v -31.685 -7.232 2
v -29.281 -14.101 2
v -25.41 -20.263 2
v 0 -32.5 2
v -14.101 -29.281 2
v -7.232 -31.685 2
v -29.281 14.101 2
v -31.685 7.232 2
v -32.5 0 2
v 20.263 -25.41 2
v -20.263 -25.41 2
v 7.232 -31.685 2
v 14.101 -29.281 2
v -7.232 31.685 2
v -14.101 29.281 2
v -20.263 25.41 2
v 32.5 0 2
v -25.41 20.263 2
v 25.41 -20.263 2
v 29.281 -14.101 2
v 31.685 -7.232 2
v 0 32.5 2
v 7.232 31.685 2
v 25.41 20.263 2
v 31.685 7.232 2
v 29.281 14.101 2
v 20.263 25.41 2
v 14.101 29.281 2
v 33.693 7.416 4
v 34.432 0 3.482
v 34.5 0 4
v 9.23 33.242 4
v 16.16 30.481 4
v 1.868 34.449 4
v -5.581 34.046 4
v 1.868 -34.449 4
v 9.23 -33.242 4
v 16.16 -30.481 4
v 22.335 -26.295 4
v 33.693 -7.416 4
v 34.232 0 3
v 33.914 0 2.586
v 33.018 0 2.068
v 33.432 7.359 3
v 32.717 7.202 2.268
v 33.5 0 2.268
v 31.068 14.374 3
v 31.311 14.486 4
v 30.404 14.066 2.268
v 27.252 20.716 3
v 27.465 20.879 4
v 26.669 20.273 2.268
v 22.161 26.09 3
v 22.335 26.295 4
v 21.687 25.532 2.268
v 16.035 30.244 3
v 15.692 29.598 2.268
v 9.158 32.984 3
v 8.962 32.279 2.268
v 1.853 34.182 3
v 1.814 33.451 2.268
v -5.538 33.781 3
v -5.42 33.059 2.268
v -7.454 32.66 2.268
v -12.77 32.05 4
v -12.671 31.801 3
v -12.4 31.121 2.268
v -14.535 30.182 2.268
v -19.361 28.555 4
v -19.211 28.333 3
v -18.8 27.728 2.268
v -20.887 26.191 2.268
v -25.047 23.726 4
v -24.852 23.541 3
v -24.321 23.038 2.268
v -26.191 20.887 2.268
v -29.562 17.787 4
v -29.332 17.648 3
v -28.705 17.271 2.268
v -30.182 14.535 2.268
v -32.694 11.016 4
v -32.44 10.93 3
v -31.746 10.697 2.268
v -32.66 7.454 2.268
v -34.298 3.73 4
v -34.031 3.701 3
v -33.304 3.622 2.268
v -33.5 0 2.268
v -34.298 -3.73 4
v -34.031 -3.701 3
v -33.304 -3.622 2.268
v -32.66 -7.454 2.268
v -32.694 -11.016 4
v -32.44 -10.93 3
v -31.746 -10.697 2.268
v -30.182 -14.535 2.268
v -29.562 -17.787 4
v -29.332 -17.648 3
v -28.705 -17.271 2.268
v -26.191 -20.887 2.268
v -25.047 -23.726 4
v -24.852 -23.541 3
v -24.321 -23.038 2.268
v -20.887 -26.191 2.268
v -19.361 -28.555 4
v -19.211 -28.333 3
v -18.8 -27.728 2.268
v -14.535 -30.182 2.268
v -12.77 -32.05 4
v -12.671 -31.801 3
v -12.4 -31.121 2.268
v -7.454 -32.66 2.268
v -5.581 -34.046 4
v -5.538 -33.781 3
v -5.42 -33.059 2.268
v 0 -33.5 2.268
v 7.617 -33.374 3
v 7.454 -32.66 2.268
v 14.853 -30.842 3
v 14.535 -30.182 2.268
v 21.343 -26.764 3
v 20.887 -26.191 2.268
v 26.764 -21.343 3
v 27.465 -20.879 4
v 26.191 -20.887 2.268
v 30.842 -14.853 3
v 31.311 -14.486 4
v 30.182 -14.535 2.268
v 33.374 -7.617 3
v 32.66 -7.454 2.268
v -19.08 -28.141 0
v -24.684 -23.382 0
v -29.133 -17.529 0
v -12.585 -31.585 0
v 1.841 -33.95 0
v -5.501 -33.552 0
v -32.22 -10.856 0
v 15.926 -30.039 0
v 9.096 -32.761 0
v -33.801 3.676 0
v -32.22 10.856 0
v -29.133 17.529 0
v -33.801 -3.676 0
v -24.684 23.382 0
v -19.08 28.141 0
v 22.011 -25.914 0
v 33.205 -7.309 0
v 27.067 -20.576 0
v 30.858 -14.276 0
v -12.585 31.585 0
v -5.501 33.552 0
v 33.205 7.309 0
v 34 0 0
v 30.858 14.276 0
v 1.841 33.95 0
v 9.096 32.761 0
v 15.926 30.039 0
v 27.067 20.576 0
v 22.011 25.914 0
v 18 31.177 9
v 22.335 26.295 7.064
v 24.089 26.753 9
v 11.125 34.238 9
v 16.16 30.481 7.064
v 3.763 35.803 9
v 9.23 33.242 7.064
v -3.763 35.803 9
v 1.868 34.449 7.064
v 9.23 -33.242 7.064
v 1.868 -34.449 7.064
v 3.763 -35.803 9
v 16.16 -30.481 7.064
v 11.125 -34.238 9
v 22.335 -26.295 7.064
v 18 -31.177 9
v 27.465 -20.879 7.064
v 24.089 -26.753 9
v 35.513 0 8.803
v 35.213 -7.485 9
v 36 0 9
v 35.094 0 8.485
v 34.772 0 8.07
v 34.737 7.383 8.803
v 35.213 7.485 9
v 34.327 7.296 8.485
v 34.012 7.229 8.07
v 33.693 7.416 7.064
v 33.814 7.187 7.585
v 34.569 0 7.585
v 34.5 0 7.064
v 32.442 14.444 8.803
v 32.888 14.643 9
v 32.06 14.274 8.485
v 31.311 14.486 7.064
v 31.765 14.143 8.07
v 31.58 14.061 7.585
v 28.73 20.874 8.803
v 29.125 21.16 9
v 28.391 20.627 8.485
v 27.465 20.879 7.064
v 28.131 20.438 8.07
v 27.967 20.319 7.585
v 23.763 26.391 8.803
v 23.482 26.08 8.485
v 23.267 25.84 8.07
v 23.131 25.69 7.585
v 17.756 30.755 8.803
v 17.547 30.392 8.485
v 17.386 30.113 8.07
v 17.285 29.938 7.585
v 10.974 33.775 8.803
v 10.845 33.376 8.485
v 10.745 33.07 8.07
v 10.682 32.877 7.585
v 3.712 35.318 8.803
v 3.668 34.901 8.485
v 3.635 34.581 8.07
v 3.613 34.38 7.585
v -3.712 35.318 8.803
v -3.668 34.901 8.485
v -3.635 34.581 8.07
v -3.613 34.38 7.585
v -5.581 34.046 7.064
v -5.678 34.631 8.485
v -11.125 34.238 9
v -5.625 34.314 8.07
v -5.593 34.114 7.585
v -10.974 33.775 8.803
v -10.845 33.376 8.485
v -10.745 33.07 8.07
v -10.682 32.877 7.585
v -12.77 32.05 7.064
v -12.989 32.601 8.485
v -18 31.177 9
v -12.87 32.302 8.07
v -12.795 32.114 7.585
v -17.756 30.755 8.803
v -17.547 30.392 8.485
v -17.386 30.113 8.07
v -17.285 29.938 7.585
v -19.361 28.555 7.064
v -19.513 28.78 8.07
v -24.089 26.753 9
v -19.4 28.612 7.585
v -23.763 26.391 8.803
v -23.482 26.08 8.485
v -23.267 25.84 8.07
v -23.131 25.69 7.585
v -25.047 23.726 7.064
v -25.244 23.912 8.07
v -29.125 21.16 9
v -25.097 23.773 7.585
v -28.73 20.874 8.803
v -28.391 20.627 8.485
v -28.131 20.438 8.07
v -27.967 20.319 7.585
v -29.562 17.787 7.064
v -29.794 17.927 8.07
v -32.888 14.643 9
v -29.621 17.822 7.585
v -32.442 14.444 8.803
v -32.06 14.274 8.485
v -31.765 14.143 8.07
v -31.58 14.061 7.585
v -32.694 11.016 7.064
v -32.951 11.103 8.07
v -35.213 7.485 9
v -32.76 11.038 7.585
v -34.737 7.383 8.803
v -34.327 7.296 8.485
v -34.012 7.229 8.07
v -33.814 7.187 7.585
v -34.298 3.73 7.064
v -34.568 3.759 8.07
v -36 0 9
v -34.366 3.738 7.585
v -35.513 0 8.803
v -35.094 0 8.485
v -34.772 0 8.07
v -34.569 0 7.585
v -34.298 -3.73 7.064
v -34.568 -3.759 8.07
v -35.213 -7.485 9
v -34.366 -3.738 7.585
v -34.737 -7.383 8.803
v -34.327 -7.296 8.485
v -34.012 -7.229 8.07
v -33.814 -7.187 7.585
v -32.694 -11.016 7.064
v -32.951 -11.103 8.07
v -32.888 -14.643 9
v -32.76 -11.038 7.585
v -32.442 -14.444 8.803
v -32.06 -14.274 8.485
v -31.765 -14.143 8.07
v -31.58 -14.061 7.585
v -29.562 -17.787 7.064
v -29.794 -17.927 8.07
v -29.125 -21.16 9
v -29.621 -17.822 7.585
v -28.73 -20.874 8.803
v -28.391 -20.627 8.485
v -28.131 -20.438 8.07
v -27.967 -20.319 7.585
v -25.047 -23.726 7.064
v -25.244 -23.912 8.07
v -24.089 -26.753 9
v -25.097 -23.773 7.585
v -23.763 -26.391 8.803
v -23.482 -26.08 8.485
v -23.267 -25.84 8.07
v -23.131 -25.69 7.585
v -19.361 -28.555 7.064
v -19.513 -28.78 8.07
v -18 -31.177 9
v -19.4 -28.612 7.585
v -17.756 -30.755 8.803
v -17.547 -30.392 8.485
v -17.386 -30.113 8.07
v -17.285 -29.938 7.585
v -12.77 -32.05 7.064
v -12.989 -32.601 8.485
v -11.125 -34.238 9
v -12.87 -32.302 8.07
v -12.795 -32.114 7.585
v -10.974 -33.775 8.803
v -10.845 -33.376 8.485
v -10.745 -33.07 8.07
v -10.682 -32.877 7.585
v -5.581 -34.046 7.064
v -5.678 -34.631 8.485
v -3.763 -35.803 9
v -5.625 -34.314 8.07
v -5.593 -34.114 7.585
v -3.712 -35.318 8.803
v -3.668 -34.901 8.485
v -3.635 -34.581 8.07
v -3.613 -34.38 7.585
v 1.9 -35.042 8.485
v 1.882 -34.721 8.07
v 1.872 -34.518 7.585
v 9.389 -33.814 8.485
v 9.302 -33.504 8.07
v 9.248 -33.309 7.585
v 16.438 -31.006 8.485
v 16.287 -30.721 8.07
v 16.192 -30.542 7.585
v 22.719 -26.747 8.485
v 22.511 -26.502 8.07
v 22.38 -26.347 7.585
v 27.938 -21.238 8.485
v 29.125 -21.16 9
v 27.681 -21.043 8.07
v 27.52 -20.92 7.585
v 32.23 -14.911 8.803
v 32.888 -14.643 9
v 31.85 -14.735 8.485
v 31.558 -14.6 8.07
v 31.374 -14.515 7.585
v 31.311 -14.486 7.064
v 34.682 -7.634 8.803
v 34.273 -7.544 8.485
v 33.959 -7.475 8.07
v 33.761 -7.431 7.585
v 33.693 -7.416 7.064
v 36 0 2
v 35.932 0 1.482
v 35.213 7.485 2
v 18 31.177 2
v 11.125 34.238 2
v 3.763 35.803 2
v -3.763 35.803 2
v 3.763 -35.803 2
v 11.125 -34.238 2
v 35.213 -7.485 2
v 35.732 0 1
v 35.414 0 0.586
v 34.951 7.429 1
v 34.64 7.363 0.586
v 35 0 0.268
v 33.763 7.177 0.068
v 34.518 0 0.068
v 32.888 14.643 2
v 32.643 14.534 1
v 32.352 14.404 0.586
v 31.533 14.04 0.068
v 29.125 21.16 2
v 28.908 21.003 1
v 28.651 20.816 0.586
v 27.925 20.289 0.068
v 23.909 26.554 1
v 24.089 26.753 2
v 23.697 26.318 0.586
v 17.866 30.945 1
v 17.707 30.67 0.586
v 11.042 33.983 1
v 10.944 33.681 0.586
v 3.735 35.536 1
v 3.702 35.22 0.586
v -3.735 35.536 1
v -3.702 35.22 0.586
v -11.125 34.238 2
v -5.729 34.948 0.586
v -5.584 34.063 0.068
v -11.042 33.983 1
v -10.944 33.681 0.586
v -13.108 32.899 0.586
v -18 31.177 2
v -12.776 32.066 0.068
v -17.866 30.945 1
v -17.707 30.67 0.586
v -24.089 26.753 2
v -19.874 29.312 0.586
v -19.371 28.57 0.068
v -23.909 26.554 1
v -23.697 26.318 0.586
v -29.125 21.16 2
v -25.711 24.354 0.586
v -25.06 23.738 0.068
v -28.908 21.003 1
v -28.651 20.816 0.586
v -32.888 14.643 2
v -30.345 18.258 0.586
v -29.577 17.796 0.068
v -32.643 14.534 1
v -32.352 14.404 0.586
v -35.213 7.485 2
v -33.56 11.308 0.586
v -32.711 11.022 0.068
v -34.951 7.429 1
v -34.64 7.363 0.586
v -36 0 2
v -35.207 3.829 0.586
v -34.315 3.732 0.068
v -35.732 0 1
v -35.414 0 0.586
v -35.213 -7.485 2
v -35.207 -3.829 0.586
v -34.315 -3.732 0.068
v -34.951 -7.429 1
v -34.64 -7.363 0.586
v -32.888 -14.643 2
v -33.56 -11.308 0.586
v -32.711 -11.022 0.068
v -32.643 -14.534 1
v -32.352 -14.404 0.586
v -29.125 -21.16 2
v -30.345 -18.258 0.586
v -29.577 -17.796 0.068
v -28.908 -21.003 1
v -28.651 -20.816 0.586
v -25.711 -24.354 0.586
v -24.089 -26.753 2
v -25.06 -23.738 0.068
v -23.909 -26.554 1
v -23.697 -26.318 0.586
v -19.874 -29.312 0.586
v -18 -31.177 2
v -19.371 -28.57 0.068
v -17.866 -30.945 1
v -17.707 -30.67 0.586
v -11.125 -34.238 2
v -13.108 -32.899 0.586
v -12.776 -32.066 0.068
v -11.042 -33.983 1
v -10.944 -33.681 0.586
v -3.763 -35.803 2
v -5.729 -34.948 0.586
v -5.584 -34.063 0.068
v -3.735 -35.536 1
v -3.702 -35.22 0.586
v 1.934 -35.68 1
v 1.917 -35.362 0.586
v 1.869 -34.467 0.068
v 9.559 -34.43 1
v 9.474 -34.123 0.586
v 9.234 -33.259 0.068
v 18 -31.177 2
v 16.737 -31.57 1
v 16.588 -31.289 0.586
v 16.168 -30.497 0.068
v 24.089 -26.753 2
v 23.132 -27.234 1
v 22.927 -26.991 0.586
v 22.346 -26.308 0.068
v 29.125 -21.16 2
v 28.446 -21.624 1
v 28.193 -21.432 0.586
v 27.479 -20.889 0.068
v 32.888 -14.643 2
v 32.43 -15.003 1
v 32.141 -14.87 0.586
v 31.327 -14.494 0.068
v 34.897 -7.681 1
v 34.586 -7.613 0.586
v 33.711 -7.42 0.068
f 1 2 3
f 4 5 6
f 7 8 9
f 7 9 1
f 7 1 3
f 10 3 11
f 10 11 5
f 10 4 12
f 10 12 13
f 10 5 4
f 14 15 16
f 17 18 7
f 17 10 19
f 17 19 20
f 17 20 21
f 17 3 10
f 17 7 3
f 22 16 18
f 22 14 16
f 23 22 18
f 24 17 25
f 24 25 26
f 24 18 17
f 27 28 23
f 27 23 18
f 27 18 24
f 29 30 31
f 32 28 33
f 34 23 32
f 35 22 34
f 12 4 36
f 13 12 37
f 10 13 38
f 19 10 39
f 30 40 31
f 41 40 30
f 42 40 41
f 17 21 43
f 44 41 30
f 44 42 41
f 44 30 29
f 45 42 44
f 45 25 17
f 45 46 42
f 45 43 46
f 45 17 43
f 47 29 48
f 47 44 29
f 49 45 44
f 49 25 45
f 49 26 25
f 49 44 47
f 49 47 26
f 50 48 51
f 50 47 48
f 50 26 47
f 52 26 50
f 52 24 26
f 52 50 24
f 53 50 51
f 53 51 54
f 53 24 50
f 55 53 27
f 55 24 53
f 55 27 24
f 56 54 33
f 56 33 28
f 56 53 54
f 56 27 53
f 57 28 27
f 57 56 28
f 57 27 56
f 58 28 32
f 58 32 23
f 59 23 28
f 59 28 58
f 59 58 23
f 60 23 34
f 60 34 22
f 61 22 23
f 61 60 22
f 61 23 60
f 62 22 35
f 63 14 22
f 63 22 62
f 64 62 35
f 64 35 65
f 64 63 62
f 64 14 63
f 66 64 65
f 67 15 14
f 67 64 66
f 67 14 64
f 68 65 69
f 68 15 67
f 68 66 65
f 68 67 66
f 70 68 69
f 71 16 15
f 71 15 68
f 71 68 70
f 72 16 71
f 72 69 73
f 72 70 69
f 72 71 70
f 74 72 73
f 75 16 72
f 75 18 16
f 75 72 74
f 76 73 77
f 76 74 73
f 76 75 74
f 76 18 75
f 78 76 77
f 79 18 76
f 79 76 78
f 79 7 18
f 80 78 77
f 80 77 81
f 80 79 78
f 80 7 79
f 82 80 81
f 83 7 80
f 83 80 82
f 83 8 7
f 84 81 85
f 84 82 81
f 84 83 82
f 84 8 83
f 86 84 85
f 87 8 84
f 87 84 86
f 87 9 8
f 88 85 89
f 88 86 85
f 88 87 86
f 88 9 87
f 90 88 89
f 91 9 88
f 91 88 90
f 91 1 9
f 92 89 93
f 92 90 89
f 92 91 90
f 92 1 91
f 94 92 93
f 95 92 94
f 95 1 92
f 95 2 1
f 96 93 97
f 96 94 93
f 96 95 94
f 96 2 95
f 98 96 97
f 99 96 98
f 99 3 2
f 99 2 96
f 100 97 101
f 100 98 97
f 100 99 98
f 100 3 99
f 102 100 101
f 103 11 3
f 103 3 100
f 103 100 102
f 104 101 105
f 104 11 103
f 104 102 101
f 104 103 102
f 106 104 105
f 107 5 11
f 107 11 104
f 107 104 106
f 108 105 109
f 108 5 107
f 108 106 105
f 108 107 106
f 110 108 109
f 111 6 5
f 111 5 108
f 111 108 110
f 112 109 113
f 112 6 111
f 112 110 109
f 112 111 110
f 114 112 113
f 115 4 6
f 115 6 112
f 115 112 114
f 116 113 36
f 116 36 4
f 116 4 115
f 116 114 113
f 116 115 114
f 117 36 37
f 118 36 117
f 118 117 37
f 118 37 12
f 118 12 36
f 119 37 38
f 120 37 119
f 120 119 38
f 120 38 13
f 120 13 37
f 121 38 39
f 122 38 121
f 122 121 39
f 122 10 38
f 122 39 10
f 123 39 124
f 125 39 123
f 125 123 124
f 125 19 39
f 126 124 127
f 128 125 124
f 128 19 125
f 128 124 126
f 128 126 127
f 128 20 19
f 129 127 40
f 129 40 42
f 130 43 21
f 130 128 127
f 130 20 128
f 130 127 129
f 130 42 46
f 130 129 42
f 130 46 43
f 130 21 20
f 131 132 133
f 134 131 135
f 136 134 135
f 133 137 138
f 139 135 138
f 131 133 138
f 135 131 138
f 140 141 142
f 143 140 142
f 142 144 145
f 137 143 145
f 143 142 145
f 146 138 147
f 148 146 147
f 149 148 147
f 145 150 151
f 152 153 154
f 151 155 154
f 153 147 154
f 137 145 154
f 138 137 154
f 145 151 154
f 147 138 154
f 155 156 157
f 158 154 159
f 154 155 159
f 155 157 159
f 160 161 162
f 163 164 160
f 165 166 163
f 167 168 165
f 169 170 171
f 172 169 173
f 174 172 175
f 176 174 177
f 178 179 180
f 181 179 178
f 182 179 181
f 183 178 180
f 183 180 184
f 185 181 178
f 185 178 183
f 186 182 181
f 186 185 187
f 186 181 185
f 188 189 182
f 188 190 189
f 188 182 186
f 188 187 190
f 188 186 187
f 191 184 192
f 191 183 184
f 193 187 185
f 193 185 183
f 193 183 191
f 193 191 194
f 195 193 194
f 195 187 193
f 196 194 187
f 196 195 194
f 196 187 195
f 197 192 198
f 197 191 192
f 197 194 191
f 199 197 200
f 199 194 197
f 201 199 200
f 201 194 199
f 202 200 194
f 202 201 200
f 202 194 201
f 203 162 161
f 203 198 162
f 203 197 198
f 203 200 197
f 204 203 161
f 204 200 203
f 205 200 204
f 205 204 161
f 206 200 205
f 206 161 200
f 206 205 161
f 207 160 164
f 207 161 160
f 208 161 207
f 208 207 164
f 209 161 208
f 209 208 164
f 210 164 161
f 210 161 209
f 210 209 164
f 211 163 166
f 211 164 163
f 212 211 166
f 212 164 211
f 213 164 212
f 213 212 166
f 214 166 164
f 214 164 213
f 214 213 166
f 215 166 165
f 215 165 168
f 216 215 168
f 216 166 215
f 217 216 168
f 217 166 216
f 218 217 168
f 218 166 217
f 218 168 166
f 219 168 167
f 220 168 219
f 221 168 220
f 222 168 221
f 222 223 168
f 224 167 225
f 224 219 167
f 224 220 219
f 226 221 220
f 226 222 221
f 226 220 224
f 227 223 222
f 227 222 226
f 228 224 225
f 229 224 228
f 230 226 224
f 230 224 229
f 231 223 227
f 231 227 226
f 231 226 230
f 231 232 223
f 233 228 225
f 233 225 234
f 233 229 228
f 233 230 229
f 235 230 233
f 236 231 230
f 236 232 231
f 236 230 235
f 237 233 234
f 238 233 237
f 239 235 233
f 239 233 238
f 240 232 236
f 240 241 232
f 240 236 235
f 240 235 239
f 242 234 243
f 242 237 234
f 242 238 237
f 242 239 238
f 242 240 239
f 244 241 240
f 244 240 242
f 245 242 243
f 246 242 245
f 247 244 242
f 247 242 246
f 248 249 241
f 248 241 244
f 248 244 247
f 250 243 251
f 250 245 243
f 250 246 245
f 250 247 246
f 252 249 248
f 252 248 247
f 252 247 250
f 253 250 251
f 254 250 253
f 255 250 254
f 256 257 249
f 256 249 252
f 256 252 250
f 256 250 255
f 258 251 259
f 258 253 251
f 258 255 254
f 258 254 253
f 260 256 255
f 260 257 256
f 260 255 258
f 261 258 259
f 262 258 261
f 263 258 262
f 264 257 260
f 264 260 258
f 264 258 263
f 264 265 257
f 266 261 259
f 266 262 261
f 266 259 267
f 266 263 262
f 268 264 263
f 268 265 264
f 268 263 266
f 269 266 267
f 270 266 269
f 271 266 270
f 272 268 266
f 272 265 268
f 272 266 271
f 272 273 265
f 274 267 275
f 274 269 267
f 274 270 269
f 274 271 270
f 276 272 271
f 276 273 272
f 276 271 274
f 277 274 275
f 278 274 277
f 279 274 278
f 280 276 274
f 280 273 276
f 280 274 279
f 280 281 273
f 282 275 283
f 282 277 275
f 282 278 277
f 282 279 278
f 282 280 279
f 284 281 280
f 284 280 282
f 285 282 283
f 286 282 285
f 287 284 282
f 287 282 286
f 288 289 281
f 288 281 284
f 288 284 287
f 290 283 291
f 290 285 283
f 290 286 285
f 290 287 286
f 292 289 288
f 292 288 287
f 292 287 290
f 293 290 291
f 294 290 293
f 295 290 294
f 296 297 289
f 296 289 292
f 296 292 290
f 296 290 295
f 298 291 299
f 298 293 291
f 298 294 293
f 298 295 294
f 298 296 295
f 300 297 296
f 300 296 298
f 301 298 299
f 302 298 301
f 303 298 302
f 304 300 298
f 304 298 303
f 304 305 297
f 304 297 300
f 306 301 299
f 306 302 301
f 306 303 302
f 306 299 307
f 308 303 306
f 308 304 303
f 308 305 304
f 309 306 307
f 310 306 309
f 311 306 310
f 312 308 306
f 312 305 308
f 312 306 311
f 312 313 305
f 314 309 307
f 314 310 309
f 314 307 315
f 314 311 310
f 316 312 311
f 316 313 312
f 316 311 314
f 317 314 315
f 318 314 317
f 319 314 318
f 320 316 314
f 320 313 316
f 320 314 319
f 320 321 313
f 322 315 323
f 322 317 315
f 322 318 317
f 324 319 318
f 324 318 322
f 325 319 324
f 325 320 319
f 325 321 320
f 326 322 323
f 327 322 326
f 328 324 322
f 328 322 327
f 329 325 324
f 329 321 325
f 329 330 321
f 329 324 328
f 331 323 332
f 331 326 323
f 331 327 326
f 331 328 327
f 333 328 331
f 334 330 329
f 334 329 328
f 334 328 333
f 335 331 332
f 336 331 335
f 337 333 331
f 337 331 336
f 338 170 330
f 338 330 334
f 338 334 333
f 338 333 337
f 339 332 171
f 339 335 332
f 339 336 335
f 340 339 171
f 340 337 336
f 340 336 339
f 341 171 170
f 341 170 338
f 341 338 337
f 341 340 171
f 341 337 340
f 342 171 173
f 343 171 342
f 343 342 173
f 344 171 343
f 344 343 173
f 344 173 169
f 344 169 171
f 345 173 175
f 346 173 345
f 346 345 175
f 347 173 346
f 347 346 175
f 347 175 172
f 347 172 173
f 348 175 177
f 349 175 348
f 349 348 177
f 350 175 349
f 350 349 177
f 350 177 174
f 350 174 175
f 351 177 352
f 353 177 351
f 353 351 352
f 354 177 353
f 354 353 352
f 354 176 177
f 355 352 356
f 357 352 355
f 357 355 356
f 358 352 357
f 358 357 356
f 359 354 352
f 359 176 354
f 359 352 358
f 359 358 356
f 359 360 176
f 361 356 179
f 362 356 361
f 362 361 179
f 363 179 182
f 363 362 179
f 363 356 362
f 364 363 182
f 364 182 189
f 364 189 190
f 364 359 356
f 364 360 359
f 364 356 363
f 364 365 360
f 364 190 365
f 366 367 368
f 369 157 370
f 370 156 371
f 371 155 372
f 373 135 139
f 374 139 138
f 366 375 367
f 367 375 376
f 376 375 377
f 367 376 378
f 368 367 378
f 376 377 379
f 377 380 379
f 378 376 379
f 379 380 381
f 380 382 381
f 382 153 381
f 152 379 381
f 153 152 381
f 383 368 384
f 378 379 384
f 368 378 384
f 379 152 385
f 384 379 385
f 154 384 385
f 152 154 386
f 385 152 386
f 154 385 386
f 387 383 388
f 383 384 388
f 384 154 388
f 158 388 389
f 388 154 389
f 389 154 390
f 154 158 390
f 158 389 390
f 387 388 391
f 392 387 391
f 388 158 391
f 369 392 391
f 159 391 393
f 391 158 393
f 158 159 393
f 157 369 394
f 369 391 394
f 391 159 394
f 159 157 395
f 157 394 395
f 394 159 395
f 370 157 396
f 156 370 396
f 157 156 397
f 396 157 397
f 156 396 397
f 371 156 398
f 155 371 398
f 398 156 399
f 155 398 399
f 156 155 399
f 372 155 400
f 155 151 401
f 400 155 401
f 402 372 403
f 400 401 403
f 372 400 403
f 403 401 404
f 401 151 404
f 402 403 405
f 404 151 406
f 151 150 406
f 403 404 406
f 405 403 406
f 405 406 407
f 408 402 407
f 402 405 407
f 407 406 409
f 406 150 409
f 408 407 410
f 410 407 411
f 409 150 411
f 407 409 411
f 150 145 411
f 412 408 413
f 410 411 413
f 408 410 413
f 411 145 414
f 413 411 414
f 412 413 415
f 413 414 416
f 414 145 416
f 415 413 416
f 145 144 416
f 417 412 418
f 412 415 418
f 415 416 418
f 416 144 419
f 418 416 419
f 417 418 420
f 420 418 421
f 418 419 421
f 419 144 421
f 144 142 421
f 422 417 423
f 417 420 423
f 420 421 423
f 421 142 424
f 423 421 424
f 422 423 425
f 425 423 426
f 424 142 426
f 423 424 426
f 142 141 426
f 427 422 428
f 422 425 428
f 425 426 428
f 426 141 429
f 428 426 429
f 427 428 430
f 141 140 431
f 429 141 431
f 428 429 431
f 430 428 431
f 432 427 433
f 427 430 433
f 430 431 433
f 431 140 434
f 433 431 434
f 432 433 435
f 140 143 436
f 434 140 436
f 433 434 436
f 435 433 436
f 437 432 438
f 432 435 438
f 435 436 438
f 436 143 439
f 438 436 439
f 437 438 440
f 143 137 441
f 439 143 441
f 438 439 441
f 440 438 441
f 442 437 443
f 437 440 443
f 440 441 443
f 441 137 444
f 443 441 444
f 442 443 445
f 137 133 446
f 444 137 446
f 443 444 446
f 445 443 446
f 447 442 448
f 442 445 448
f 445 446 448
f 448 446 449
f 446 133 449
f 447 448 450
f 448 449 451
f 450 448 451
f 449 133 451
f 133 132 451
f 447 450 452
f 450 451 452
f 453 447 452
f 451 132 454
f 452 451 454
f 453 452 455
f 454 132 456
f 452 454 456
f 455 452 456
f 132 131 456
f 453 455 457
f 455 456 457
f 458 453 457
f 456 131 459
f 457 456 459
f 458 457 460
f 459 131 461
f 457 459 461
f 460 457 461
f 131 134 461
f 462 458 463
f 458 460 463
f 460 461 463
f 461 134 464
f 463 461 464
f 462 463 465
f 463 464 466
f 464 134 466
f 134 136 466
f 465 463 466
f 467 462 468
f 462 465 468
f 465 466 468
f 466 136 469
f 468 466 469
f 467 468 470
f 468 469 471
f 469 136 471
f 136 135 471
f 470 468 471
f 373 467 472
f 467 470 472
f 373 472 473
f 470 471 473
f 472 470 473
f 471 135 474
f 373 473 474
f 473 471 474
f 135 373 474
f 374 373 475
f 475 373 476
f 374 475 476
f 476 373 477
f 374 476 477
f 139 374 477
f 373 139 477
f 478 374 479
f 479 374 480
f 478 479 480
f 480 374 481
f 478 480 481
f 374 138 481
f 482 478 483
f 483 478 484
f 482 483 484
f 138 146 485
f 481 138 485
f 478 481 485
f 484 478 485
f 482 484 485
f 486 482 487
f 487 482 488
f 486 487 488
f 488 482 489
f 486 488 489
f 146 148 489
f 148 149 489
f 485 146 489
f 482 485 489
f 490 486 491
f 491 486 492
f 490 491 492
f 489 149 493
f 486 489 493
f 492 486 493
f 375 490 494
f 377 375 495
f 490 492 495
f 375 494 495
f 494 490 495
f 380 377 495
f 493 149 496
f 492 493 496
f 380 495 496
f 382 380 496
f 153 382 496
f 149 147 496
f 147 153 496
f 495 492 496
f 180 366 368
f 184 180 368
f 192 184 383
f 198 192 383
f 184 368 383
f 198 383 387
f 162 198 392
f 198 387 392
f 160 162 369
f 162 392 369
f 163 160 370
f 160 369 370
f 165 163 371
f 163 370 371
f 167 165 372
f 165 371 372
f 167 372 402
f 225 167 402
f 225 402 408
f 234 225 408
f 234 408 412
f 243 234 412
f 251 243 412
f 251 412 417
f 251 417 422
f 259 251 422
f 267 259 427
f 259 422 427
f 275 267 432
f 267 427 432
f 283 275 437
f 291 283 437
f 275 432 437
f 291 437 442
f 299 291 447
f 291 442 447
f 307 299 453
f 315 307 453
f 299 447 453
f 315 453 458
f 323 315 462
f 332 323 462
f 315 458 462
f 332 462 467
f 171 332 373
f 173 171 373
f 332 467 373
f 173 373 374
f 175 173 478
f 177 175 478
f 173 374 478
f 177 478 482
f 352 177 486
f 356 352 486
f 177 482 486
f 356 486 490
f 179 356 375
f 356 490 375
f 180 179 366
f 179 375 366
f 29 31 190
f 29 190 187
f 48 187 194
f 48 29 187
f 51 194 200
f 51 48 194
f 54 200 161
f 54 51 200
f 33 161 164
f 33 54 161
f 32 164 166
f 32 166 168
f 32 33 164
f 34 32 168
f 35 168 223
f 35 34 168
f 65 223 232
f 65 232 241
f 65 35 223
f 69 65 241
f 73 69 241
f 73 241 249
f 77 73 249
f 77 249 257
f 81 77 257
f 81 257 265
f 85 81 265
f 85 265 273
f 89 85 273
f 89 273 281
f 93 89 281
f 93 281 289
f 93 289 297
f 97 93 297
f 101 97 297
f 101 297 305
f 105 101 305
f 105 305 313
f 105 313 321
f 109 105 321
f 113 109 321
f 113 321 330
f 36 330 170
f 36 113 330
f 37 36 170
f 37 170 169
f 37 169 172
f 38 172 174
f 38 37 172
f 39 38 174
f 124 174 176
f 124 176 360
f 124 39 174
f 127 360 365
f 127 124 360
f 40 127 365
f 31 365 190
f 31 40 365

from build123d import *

# Parameters (mm, degrees)
F0_R     = 34.5
F1_DEPTH = 2
F0_R_2   = 36
F2_DEPTH = 9
F4_R     = 2


# Not quite as in the source:
# - a fillet or chamfer that OpenCascade refuses, or shapes differently, is made with other operations: its cross-section is extruded or revolved along the edge and cut away or added


with BuildPart() as f1:
    # F0 (on Top) → F1 (new body)
    with BuildSketch(Plane.XY):
        Circle(F0_R)
    extrude(amount=F1_DEPTH)

    # F0 (on Top) → F2 (join)
    with BuildSketch(Plane.XY):
        Circle(F0_R_2)
        Circle(F0_R, mode=Mode.SUBTRACT)
    extrude(amount=F2_DEPTH)

    # F3: fillet of radius 2 on 2 edges, made by hand

    # F3_s1 → F3_t2 (revolve)
    with BuildSketch(Plane.XZ):
        with BuildLine():
            ThreePointArc((34.5, 4), (33.9142135624, 2.5857864376), (32.5, 2))
            Line((32.5, 2), (34.5, 2))
            Line((34.5, 2), (34.5, 4))
        make_face()
    revolve(axis=Axis((0, 0, 2), (0, 0, 1)))

    # F3_s3 → F3_t4 (revolve, cut)
    with BuildSketch(Plane.XZ):
        with BuildLine():
            ThreePointArc((36, 9), (34.9188611699, 8.2882531983), (34.5, 7.0635083269))
            Line((34.5, 7.0635083269), (34.5, 9))
            Line((34.5, 9), (36, 9))
        make_face()
    revolve(axis=Axis((0, 0, 9), (0, 0, 1)), mode=Mode.SUBTRACT)

    # F4
    f4_edges = [f1.edges().sort_by_distance(p)[0] for p in [
        (-36, 0, 0),
    ]]
    fillet(f4_edges, radius=F4_R)


solid = f1.part
